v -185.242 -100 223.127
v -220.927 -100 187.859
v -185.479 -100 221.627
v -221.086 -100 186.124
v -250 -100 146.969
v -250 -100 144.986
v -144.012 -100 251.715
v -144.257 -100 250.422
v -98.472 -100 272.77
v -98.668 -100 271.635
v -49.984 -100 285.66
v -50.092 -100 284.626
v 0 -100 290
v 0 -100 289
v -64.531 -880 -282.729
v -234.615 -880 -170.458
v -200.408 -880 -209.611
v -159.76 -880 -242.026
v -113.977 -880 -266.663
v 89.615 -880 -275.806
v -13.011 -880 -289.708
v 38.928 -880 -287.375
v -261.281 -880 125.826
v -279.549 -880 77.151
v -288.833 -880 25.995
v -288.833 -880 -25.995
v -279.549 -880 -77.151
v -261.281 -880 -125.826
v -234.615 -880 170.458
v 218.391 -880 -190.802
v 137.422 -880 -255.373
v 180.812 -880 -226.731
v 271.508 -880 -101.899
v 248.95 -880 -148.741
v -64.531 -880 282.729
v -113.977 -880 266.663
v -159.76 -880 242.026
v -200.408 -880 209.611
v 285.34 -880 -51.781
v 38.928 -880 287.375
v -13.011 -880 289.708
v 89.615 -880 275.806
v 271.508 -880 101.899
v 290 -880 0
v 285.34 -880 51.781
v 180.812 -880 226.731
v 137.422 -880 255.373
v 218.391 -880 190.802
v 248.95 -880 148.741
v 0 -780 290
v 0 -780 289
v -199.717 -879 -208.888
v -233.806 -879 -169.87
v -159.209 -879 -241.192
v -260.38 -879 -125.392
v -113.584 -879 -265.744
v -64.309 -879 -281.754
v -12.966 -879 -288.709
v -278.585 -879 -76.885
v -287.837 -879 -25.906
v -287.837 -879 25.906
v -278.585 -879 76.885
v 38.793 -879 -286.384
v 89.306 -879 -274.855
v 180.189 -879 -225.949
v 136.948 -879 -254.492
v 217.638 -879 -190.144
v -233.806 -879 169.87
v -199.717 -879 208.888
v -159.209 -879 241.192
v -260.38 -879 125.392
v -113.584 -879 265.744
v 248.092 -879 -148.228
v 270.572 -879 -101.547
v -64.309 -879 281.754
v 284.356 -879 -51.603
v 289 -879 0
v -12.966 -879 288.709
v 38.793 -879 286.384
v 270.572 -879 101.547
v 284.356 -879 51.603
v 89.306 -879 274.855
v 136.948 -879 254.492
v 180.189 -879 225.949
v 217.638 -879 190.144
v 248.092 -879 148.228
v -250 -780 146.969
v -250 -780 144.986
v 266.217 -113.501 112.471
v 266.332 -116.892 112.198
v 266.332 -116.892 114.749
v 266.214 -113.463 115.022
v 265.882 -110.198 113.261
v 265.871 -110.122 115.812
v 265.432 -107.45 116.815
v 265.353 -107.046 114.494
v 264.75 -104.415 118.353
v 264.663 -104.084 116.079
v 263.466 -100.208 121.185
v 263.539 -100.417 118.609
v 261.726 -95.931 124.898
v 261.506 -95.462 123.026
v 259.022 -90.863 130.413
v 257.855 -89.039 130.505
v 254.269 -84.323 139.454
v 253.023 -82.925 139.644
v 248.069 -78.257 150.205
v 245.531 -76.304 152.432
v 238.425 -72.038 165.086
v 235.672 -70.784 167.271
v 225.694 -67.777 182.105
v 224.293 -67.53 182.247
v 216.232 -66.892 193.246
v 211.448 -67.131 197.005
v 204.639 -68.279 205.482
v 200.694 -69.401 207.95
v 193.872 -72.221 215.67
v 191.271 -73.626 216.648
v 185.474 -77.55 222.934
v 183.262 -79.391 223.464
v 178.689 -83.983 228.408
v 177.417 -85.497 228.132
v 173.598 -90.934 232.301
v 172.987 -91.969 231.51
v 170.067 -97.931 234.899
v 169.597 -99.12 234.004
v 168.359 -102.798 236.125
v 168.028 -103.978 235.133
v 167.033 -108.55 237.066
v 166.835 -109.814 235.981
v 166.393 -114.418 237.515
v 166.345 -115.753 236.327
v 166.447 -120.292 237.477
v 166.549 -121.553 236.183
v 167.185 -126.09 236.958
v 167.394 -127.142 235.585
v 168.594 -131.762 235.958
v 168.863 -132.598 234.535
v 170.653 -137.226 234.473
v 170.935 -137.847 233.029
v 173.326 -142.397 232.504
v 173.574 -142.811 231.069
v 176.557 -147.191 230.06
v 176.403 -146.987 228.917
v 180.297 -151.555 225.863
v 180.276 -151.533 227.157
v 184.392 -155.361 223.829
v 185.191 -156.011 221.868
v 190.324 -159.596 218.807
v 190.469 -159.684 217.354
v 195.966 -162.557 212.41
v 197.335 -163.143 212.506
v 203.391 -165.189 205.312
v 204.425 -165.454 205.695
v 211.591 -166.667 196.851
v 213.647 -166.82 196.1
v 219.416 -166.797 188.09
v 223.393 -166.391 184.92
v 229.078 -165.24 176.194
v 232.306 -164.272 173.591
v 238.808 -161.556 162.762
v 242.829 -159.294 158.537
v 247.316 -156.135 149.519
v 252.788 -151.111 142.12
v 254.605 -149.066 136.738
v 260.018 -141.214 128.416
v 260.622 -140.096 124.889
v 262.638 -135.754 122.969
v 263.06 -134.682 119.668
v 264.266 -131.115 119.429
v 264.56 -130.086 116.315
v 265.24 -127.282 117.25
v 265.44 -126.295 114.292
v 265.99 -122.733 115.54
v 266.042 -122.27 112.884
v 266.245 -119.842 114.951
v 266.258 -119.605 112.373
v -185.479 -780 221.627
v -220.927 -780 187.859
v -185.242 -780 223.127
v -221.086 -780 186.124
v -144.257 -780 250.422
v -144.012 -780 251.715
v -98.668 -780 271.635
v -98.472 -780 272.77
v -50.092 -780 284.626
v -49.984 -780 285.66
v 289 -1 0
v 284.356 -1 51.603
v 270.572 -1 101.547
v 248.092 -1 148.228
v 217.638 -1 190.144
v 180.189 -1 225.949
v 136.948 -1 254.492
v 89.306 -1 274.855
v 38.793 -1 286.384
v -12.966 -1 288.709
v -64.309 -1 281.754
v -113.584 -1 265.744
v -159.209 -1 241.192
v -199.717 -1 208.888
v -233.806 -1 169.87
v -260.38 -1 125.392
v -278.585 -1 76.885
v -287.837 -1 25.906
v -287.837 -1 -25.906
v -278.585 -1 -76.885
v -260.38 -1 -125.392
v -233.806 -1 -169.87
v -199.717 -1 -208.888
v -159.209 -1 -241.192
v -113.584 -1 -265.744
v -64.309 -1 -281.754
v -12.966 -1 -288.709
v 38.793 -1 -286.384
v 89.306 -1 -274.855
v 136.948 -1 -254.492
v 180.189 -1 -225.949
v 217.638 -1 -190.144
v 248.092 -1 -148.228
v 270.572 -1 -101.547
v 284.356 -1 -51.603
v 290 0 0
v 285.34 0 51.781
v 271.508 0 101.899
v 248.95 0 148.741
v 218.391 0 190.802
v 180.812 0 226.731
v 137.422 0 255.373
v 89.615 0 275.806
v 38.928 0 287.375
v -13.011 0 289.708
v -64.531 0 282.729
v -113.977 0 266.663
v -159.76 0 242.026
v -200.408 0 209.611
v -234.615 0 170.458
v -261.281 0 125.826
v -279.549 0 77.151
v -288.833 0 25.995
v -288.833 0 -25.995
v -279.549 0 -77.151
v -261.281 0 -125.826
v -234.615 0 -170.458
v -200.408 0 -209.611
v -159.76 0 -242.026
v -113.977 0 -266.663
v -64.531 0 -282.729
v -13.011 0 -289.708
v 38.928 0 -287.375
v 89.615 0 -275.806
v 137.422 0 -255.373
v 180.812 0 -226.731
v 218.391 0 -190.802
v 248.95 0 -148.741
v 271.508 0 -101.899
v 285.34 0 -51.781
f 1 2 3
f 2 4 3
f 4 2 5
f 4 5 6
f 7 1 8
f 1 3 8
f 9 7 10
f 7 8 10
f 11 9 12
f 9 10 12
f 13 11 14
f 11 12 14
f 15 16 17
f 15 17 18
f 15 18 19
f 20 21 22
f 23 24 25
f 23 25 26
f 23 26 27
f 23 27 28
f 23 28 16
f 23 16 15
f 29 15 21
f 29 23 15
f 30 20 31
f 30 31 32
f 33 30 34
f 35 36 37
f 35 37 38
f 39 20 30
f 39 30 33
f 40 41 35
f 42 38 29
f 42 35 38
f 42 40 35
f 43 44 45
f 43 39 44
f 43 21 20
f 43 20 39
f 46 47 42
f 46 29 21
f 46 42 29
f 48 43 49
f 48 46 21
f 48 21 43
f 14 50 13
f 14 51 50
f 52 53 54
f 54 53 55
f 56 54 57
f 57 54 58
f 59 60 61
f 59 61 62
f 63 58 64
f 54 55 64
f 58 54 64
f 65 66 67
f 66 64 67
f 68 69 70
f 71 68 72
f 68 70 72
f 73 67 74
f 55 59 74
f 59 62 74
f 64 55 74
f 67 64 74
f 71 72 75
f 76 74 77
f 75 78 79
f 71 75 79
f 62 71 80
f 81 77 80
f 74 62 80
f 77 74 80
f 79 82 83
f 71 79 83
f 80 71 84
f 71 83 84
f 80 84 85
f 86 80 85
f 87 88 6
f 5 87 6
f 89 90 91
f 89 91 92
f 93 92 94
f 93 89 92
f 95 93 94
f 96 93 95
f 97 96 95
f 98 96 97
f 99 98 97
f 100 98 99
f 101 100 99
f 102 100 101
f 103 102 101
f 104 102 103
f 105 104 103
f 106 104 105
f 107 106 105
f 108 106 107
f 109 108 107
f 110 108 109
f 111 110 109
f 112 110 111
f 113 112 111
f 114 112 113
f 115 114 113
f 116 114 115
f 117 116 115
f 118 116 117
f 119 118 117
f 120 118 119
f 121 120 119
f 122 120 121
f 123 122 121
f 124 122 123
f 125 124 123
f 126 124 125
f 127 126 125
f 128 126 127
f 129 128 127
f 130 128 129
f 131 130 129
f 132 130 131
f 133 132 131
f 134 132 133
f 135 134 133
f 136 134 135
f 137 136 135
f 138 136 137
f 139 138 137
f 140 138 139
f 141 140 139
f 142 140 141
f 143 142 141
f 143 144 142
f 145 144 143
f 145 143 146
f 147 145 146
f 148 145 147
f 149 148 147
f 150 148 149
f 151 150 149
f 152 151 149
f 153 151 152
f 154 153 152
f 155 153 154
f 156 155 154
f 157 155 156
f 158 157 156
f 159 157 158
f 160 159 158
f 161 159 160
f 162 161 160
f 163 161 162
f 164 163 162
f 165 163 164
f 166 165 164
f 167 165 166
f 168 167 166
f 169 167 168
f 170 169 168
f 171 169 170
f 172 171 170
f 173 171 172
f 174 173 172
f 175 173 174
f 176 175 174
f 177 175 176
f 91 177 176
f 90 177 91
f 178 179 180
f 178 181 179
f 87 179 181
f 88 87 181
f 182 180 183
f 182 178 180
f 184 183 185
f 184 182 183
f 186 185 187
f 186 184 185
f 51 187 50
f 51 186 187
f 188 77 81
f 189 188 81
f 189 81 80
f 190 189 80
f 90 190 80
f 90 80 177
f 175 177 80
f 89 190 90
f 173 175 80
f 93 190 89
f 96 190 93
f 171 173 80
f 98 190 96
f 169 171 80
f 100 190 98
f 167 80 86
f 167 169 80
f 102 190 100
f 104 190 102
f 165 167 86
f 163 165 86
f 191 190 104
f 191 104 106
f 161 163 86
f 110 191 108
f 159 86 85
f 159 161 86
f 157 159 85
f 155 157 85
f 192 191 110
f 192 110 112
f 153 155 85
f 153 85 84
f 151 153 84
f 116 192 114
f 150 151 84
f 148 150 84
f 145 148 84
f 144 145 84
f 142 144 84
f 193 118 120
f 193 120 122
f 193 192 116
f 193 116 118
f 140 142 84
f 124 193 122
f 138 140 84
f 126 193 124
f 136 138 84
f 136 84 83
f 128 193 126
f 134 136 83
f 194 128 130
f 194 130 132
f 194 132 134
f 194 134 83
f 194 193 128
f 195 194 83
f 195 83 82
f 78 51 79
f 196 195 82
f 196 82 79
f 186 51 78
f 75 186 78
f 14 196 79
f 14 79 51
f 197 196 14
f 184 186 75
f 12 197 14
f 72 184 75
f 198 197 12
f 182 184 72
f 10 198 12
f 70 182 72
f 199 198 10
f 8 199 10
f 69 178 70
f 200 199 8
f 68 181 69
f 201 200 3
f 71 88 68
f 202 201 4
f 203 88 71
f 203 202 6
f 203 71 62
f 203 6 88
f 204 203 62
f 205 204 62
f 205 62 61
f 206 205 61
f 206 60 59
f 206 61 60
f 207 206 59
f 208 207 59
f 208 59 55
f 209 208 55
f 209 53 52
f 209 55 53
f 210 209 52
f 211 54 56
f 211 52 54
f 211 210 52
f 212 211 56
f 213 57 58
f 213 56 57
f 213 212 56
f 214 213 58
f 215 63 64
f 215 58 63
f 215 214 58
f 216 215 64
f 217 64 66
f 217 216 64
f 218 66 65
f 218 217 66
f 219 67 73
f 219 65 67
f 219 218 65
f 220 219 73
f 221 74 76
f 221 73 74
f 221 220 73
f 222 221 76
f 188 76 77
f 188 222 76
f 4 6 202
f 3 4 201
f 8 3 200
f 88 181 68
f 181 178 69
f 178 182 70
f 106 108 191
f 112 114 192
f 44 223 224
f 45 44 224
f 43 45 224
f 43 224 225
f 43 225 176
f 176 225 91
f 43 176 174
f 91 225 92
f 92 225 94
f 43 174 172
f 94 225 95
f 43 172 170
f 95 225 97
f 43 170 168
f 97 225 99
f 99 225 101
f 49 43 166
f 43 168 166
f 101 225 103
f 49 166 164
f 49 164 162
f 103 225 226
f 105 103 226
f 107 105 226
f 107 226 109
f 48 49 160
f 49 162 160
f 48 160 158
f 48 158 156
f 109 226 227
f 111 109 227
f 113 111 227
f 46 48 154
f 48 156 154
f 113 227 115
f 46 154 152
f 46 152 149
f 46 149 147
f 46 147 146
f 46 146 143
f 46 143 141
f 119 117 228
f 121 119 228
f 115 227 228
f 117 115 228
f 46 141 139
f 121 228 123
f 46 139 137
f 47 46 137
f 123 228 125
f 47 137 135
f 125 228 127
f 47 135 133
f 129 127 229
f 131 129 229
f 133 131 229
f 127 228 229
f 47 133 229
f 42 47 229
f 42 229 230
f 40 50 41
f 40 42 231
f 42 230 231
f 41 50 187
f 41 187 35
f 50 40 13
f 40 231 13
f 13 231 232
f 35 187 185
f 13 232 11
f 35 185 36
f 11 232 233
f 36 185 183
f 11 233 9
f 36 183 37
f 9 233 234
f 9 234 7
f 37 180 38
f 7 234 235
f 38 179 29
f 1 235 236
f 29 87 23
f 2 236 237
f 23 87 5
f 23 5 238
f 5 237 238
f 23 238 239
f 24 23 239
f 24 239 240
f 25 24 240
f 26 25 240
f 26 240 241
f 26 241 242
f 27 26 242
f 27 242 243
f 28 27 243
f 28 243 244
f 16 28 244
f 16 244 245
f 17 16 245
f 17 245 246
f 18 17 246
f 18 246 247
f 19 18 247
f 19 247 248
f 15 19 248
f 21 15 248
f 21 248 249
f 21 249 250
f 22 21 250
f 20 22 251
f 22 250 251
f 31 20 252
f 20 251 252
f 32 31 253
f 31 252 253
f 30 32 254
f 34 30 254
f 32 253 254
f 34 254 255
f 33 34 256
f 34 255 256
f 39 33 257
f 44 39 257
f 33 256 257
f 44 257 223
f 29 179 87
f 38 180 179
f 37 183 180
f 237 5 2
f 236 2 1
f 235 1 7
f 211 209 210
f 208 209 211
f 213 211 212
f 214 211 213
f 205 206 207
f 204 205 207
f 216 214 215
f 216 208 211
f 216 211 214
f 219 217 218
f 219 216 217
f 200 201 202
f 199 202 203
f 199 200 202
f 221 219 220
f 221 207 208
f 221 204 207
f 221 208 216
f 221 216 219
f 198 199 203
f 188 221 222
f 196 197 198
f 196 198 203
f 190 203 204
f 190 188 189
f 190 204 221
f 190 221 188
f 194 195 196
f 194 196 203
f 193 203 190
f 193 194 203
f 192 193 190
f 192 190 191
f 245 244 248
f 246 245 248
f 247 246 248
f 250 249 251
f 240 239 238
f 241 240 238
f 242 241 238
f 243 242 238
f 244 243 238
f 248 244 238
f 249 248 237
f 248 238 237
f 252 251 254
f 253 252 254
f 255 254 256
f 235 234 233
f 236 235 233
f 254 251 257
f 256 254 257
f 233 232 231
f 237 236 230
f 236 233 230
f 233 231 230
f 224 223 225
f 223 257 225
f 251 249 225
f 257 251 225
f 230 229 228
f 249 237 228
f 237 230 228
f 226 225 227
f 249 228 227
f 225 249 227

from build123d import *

# Parameters (mm, degrees)
F0_R     = 290
F1_DEPTH = 880
F2_W     = 250
F2_H     = 680
F3_DEPTH = 566
F4_T     = -1
F5_R     = 50
F6_DEPTH = 314


with BuildPart() as f1:
    # F0 (on Front) → F1 (new body)
    with BuildSketch(Plane.XZ):
        Circle(F0_R)
    extrude(amount=F1_DEPTH)

    # F2 (on Top) → F3 (cut)
    with BuildSketch(Plane.XY):
        with Locations((-125, -440)):
            Rectangle(F2_W, F2_H)
    extrude(amount=F3_DEPTH, mode=Mode.SUBTRACT)

    # F4
    f4_openings = [f1.faces().sort_by_distance(p)[0] for p in [
        (0, -440, 145),
        (-250, -440, 73.484692),
        (-125, -440, 0),
        (-113.917816, -780, 127.398954),
        (-113.917816, -100, 127.398954),
    ]]
    offset(amount=F4_T, openings=f4_openings)

    # F5 (on Top) → F6 (cut)
    with BuildSketch(Plane.XY):
        with Locations((216.3317799568, -116.8923303485)):
            Circle(F5_R)
    extrude(amount=F6_DEPTH, mode=Mode.SUBTRACT)


solid = f1.part
